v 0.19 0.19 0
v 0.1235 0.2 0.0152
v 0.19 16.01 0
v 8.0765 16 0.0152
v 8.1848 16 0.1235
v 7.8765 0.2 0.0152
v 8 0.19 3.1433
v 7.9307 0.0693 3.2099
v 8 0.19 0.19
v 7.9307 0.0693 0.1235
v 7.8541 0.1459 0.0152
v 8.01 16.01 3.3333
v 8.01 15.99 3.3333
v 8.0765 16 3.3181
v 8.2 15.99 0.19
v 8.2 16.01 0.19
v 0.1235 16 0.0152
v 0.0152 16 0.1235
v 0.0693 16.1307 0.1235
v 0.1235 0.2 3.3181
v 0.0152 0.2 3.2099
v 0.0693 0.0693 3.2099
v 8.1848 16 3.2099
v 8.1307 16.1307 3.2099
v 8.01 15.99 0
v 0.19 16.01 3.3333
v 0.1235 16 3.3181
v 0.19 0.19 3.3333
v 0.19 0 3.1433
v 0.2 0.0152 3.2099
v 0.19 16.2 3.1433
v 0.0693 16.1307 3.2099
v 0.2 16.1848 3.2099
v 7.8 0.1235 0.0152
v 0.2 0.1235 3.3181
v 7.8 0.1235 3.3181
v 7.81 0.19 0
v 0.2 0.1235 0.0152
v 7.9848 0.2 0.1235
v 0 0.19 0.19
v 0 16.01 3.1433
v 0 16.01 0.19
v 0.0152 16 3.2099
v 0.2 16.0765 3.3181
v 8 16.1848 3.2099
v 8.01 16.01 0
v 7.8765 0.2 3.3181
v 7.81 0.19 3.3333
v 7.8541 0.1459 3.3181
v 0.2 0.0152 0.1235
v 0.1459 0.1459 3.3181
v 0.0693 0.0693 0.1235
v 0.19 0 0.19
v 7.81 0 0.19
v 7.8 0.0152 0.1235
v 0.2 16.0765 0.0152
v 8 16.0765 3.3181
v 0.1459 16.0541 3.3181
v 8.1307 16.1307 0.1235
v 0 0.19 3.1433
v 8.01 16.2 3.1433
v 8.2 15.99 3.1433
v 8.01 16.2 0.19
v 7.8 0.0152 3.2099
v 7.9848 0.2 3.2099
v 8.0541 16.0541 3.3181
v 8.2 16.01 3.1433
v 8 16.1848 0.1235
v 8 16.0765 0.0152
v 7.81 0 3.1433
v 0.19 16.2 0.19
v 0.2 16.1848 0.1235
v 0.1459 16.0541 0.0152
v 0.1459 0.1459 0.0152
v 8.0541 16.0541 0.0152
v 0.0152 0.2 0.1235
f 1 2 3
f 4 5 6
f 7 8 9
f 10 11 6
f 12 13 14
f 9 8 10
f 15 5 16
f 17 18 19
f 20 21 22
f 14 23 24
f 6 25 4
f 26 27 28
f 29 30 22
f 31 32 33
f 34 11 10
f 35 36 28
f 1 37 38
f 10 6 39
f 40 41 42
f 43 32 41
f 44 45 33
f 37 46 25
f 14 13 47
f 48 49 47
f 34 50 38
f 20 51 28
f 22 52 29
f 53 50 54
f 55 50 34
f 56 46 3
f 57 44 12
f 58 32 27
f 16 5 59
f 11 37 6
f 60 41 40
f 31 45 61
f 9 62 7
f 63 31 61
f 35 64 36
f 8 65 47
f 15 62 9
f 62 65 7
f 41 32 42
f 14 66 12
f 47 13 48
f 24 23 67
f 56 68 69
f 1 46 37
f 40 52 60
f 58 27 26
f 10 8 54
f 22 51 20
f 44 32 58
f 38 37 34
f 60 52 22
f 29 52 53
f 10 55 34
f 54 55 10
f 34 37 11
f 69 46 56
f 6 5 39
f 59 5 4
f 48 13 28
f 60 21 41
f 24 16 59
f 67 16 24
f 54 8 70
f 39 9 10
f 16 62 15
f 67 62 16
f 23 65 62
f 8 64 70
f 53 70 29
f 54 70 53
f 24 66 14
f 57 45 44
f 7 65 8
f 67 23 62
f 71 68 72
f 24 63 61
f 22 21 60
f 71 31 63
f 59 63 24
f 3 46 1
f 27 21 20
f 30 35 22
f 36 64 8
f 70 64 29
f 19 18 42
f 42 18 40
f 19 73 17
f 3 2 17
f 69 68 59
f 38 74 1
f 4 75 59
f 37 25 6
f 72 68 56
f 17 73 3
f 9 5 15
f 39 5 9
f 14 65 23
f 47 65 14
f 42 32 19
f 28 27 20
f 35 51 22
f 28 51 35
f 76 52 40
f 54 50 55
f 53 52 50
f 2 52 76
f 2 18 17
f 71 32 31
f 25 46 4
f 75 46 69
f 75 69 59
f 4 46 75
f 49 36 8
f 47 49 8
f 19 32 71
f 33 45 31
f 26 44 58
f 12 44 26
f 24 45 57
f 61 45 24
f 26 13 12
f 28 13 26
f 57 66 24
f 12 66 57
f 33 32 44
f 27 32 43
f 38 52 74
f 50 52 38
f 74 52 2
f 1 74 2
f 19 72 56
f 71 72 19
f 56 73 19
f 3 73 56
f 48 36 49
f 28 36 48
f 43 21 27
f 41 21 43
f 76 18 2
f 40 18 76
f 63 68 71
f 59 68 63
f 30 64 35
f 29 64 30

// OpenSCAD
// Lego Compatible Build Modules

test_module="test lcbm_peg";
test_module="test lcbm_socket_hole";
test_module="test lcbm_block_body";
//test_module="test lcbm_letter_peg";

module lcbm_peg(peg_d=4.9,peg_h=1.8,peg_bevel=0.2,peg_base_ext=0.1,peg_hole_d=1.8,peg_hole_bevel=0.1,flat_side_w=1.0) {
    $fn=16;
    render() difference() {
        hull() {
            translate([0,0,-peg_base_ext]) cylinder(r=peg_d/2,h=peg_base_ext+peg_h-peg_bevel);
            if(flat_side_w>0.0) {
                translate([0,0,peg_h/2-peg_bevel]) {
                    cube([flat_side_w,peg_d,peg_h-2*peg_bevel],center=true);
                    cube([peg_d,flat_side_w,peg_h-2*peg_bevel],center=true);
                }
            }
            if(peg_bevel>0.0) {
                translate([0,0,peg_h-peg_bevel]) cylinder(r1=peg_d/2,r2=peg_d/2-peg_bevel,h=peg_bevel);
            }
        }
        if(peg_hole_d>0.0) {
            translate([0,0,-peg_base_ext]) {
                cylinder(r=peg_hole_d/2,h=peg_base_ext+peg_h);
            }
            if(peg_hole_bevel>0.0) {
                translate([0,0,-peg_base_ext]) cylinder(r1=peg_hole_d/2+peg_hole_bevel,r2=peg_hole_d/2,h=peg_hole_bevel);
                translate([0,0,peg_h-peg_hole_bevel]) cylinder(r1=peg_hole_d/2,r2=peg_hole_d/2+peg_hole_bevel,h=peg_hole_bevel);
            }
        }
    }
}

if(test_module=="test lcbm_peg") {
    echo("Testing lcbm_peg...");
    lcbm_peg();
}

module lcbm_socket_hole(socket_d=4.9, socket_h=2.0, socket_bevel=0.2, socket_base_ext=0.1, socket_hole_d=1.8, socket_hole_h=3.3,socket_hole_bevel=0.1,flat_side_w=1.5) {
    $fn=16;
    render() {
        union() {
            hull() {
                translate([0,0,-socket_base_ext]) cylinder(r1=socket_base_ext+socket_d/2+socket_bevel,r2=socket_d/2,h=socket_base_ext+socket_bevel);
                if(flat_side_w>0.0) {
                    translate([0,0,-socket_base_ext/2]) {
                        cube([flat_side_w,socket_d,socket_base_ext],center=true);
                        cube([socket_d,flat_side_w,socket_base_ext],center=true);
                    }
                }
            }
            hull() {
                cylinder(r=socket_d/2,h=socket_h-socket_bevel);
                if(flat_side_w>0.0) {
                    translate([0,0,socket_h/2-socket_bevel]) {
                        cube([flat_side_w,socket_d,socket_h-2*socket_bevel],center=true);
                        cube([socket_d,flat_side_w,socket_h-2*socket_bevel],center=true);
                    }
                }
                if(socket_bevel>0.0) {
                    translate([0,0,socket_h-socket_bevel]) cylinder(r1=socket_d/2,r2=socket_d/2-socket_bevel,h=socket_bevel);
                }
            }
            if(socket_hole_d>0.0) {
                cylinder(r=socket_hole_d/2,h=socket_hole_h);
                translate([0,0,socket_h]) cylinder(r1=socket_hole_d/2+2*socket_hole_bevel,r2=socket_hole_d/2,h=2*socket_hole_bevel,center=true);
                if(socket_hole_bevel>0.0) {
                    translate([0,0,socket_hole_h-socket_hole_bevel]) cylinder(r1=socket_hole_d/2,r2=socket_hole_d/2+socket_hole_bevel,h=socket_hole_bevel,center=false);
                }
            }
        }
    }
}

if(test_module=="test lcbm_socket_hole") {
    echo("Testing lcbm_socket_hole...");
    lcbm_socket_hole();
}

module lcbm_corner_bevel(bevel=0.2,flat=0.0) {
    local_flat=(flat>0.0&&flat<=bevel)?flat:0.1*bevel;
    hull() {
        sphere(r=bevel,$fn=8);
        cube([2*bevel,local_flat,local_flat],center=true);
        cube([local_flat,2*bevel,local_flat],center=true);
        cube([local_flat,local_flat,2*bevel],center=true);
    }
}

module lcbm_block_body(unit=[8.0,8.0,10.0/3.0],size=[1,1,1],bevel=0.2,flat=0.0,center=true) {
    offset_x=(center)?-size[0]*unit[0]/2:0.0;
    offset_y=(center)?-size[1]*unit[1]/2:0.0;
    translate([offset_x,offset_y]) hull() {
        translate([bevel,bevel,0]) {
            translate([0,0,bevel]) lcbm_corner_bevel(bevel=bevel,flat=flat);
            translate([0,0,unit[2]*size[2]-bevel]) lcbm_corner_bevel(bevel=bevel,flat=flat);
        }
        translate([unit[0]*size[0]-bevel,bevel,0]) {
            translate([0,0,bevel]) lcbm_corner_bevel(bevel=bevel,flat=flat);
            translate([0,0,unit[2]*size[2]-bevel]) lcbm_corner_bevel(bevel=bevel,flat=flat);
        }
        translate([bevel,unit[1]*size[1],0]) {
            translate([0,0,bevel]) lcbm_corner_bevel(bevel=bevel,flat=flat);
            translate([0,0,unit[2]*size[2]-bevel]) lcbm_corner_bevel(bevel=bevel,flat=flat);
        }
        translate([unit[0]*size[0],unit[1]*size[1],0]) {
            translate([0,0,bevel]) lcbm_corner_bevel(bevel=bevel,flat=flat);
            translate([0,0,unit[2]*size[2]-bevel]) lcbm_corner_bevel(bevel=bevel,flat=flat);
        }
    }
}

if(test_module=="test lcbm_block_body") {
    echo("Testing lcbm_block_body...");
    lcbm_block_body(size=[1,2,1],center=false);
}

module lcbm_letter_peg(letter="A",letter_h=0.2,letter_size=0.707*4.9,block_h=3.2,block_w=8.0,block_bevel=0.2,peg_h=1.7,min_wall_th=1.0) {
    difference() {
        union() {
            translate([0,0,block_h/2]) minkowski() {
                cube([block_w-2*block_bevel,block_w-2*block_bevel,block_h-2*block_bevel],center=true);
                hull() {
                    sphere(r=block_bevel,$fn=8);
                    cube([2*block_bevel,0.1*block_bevel,0.1*block_bevel],center=true);
                    cube([0.1*block_bevel,2*block_bevel,0.1*block_bevel],center=true);
                    cube([0.1*block_bevel,0.1*block_bevel,2*block_bevel],center=true);
                }
            }
            translate([0,0,block_h]) lcbm_peg(peg_h=peg_h,peg_hole_d=0);
            translate([0,0,block_h+peg_h]) {
                linear_extrude(height=2*letter_h,center=true) text(letter,halign="center",valign="center",size=letter_size);
            }
        }
        lcbm_socket_hole(socket_h=block_h-min_wall_th,socket_hole_h=block_h+peg_h-min_wall_th,socket_hole_bevel=0,flat_side_w=3.0);
    }
}

if(test_module=="test lcbm_letter_peg") {
    echo("Testing lcb_letter_peg...");
    difference() {
        lcbm_letter_peg("B");
        cube([10,10,10]);
    }
}
